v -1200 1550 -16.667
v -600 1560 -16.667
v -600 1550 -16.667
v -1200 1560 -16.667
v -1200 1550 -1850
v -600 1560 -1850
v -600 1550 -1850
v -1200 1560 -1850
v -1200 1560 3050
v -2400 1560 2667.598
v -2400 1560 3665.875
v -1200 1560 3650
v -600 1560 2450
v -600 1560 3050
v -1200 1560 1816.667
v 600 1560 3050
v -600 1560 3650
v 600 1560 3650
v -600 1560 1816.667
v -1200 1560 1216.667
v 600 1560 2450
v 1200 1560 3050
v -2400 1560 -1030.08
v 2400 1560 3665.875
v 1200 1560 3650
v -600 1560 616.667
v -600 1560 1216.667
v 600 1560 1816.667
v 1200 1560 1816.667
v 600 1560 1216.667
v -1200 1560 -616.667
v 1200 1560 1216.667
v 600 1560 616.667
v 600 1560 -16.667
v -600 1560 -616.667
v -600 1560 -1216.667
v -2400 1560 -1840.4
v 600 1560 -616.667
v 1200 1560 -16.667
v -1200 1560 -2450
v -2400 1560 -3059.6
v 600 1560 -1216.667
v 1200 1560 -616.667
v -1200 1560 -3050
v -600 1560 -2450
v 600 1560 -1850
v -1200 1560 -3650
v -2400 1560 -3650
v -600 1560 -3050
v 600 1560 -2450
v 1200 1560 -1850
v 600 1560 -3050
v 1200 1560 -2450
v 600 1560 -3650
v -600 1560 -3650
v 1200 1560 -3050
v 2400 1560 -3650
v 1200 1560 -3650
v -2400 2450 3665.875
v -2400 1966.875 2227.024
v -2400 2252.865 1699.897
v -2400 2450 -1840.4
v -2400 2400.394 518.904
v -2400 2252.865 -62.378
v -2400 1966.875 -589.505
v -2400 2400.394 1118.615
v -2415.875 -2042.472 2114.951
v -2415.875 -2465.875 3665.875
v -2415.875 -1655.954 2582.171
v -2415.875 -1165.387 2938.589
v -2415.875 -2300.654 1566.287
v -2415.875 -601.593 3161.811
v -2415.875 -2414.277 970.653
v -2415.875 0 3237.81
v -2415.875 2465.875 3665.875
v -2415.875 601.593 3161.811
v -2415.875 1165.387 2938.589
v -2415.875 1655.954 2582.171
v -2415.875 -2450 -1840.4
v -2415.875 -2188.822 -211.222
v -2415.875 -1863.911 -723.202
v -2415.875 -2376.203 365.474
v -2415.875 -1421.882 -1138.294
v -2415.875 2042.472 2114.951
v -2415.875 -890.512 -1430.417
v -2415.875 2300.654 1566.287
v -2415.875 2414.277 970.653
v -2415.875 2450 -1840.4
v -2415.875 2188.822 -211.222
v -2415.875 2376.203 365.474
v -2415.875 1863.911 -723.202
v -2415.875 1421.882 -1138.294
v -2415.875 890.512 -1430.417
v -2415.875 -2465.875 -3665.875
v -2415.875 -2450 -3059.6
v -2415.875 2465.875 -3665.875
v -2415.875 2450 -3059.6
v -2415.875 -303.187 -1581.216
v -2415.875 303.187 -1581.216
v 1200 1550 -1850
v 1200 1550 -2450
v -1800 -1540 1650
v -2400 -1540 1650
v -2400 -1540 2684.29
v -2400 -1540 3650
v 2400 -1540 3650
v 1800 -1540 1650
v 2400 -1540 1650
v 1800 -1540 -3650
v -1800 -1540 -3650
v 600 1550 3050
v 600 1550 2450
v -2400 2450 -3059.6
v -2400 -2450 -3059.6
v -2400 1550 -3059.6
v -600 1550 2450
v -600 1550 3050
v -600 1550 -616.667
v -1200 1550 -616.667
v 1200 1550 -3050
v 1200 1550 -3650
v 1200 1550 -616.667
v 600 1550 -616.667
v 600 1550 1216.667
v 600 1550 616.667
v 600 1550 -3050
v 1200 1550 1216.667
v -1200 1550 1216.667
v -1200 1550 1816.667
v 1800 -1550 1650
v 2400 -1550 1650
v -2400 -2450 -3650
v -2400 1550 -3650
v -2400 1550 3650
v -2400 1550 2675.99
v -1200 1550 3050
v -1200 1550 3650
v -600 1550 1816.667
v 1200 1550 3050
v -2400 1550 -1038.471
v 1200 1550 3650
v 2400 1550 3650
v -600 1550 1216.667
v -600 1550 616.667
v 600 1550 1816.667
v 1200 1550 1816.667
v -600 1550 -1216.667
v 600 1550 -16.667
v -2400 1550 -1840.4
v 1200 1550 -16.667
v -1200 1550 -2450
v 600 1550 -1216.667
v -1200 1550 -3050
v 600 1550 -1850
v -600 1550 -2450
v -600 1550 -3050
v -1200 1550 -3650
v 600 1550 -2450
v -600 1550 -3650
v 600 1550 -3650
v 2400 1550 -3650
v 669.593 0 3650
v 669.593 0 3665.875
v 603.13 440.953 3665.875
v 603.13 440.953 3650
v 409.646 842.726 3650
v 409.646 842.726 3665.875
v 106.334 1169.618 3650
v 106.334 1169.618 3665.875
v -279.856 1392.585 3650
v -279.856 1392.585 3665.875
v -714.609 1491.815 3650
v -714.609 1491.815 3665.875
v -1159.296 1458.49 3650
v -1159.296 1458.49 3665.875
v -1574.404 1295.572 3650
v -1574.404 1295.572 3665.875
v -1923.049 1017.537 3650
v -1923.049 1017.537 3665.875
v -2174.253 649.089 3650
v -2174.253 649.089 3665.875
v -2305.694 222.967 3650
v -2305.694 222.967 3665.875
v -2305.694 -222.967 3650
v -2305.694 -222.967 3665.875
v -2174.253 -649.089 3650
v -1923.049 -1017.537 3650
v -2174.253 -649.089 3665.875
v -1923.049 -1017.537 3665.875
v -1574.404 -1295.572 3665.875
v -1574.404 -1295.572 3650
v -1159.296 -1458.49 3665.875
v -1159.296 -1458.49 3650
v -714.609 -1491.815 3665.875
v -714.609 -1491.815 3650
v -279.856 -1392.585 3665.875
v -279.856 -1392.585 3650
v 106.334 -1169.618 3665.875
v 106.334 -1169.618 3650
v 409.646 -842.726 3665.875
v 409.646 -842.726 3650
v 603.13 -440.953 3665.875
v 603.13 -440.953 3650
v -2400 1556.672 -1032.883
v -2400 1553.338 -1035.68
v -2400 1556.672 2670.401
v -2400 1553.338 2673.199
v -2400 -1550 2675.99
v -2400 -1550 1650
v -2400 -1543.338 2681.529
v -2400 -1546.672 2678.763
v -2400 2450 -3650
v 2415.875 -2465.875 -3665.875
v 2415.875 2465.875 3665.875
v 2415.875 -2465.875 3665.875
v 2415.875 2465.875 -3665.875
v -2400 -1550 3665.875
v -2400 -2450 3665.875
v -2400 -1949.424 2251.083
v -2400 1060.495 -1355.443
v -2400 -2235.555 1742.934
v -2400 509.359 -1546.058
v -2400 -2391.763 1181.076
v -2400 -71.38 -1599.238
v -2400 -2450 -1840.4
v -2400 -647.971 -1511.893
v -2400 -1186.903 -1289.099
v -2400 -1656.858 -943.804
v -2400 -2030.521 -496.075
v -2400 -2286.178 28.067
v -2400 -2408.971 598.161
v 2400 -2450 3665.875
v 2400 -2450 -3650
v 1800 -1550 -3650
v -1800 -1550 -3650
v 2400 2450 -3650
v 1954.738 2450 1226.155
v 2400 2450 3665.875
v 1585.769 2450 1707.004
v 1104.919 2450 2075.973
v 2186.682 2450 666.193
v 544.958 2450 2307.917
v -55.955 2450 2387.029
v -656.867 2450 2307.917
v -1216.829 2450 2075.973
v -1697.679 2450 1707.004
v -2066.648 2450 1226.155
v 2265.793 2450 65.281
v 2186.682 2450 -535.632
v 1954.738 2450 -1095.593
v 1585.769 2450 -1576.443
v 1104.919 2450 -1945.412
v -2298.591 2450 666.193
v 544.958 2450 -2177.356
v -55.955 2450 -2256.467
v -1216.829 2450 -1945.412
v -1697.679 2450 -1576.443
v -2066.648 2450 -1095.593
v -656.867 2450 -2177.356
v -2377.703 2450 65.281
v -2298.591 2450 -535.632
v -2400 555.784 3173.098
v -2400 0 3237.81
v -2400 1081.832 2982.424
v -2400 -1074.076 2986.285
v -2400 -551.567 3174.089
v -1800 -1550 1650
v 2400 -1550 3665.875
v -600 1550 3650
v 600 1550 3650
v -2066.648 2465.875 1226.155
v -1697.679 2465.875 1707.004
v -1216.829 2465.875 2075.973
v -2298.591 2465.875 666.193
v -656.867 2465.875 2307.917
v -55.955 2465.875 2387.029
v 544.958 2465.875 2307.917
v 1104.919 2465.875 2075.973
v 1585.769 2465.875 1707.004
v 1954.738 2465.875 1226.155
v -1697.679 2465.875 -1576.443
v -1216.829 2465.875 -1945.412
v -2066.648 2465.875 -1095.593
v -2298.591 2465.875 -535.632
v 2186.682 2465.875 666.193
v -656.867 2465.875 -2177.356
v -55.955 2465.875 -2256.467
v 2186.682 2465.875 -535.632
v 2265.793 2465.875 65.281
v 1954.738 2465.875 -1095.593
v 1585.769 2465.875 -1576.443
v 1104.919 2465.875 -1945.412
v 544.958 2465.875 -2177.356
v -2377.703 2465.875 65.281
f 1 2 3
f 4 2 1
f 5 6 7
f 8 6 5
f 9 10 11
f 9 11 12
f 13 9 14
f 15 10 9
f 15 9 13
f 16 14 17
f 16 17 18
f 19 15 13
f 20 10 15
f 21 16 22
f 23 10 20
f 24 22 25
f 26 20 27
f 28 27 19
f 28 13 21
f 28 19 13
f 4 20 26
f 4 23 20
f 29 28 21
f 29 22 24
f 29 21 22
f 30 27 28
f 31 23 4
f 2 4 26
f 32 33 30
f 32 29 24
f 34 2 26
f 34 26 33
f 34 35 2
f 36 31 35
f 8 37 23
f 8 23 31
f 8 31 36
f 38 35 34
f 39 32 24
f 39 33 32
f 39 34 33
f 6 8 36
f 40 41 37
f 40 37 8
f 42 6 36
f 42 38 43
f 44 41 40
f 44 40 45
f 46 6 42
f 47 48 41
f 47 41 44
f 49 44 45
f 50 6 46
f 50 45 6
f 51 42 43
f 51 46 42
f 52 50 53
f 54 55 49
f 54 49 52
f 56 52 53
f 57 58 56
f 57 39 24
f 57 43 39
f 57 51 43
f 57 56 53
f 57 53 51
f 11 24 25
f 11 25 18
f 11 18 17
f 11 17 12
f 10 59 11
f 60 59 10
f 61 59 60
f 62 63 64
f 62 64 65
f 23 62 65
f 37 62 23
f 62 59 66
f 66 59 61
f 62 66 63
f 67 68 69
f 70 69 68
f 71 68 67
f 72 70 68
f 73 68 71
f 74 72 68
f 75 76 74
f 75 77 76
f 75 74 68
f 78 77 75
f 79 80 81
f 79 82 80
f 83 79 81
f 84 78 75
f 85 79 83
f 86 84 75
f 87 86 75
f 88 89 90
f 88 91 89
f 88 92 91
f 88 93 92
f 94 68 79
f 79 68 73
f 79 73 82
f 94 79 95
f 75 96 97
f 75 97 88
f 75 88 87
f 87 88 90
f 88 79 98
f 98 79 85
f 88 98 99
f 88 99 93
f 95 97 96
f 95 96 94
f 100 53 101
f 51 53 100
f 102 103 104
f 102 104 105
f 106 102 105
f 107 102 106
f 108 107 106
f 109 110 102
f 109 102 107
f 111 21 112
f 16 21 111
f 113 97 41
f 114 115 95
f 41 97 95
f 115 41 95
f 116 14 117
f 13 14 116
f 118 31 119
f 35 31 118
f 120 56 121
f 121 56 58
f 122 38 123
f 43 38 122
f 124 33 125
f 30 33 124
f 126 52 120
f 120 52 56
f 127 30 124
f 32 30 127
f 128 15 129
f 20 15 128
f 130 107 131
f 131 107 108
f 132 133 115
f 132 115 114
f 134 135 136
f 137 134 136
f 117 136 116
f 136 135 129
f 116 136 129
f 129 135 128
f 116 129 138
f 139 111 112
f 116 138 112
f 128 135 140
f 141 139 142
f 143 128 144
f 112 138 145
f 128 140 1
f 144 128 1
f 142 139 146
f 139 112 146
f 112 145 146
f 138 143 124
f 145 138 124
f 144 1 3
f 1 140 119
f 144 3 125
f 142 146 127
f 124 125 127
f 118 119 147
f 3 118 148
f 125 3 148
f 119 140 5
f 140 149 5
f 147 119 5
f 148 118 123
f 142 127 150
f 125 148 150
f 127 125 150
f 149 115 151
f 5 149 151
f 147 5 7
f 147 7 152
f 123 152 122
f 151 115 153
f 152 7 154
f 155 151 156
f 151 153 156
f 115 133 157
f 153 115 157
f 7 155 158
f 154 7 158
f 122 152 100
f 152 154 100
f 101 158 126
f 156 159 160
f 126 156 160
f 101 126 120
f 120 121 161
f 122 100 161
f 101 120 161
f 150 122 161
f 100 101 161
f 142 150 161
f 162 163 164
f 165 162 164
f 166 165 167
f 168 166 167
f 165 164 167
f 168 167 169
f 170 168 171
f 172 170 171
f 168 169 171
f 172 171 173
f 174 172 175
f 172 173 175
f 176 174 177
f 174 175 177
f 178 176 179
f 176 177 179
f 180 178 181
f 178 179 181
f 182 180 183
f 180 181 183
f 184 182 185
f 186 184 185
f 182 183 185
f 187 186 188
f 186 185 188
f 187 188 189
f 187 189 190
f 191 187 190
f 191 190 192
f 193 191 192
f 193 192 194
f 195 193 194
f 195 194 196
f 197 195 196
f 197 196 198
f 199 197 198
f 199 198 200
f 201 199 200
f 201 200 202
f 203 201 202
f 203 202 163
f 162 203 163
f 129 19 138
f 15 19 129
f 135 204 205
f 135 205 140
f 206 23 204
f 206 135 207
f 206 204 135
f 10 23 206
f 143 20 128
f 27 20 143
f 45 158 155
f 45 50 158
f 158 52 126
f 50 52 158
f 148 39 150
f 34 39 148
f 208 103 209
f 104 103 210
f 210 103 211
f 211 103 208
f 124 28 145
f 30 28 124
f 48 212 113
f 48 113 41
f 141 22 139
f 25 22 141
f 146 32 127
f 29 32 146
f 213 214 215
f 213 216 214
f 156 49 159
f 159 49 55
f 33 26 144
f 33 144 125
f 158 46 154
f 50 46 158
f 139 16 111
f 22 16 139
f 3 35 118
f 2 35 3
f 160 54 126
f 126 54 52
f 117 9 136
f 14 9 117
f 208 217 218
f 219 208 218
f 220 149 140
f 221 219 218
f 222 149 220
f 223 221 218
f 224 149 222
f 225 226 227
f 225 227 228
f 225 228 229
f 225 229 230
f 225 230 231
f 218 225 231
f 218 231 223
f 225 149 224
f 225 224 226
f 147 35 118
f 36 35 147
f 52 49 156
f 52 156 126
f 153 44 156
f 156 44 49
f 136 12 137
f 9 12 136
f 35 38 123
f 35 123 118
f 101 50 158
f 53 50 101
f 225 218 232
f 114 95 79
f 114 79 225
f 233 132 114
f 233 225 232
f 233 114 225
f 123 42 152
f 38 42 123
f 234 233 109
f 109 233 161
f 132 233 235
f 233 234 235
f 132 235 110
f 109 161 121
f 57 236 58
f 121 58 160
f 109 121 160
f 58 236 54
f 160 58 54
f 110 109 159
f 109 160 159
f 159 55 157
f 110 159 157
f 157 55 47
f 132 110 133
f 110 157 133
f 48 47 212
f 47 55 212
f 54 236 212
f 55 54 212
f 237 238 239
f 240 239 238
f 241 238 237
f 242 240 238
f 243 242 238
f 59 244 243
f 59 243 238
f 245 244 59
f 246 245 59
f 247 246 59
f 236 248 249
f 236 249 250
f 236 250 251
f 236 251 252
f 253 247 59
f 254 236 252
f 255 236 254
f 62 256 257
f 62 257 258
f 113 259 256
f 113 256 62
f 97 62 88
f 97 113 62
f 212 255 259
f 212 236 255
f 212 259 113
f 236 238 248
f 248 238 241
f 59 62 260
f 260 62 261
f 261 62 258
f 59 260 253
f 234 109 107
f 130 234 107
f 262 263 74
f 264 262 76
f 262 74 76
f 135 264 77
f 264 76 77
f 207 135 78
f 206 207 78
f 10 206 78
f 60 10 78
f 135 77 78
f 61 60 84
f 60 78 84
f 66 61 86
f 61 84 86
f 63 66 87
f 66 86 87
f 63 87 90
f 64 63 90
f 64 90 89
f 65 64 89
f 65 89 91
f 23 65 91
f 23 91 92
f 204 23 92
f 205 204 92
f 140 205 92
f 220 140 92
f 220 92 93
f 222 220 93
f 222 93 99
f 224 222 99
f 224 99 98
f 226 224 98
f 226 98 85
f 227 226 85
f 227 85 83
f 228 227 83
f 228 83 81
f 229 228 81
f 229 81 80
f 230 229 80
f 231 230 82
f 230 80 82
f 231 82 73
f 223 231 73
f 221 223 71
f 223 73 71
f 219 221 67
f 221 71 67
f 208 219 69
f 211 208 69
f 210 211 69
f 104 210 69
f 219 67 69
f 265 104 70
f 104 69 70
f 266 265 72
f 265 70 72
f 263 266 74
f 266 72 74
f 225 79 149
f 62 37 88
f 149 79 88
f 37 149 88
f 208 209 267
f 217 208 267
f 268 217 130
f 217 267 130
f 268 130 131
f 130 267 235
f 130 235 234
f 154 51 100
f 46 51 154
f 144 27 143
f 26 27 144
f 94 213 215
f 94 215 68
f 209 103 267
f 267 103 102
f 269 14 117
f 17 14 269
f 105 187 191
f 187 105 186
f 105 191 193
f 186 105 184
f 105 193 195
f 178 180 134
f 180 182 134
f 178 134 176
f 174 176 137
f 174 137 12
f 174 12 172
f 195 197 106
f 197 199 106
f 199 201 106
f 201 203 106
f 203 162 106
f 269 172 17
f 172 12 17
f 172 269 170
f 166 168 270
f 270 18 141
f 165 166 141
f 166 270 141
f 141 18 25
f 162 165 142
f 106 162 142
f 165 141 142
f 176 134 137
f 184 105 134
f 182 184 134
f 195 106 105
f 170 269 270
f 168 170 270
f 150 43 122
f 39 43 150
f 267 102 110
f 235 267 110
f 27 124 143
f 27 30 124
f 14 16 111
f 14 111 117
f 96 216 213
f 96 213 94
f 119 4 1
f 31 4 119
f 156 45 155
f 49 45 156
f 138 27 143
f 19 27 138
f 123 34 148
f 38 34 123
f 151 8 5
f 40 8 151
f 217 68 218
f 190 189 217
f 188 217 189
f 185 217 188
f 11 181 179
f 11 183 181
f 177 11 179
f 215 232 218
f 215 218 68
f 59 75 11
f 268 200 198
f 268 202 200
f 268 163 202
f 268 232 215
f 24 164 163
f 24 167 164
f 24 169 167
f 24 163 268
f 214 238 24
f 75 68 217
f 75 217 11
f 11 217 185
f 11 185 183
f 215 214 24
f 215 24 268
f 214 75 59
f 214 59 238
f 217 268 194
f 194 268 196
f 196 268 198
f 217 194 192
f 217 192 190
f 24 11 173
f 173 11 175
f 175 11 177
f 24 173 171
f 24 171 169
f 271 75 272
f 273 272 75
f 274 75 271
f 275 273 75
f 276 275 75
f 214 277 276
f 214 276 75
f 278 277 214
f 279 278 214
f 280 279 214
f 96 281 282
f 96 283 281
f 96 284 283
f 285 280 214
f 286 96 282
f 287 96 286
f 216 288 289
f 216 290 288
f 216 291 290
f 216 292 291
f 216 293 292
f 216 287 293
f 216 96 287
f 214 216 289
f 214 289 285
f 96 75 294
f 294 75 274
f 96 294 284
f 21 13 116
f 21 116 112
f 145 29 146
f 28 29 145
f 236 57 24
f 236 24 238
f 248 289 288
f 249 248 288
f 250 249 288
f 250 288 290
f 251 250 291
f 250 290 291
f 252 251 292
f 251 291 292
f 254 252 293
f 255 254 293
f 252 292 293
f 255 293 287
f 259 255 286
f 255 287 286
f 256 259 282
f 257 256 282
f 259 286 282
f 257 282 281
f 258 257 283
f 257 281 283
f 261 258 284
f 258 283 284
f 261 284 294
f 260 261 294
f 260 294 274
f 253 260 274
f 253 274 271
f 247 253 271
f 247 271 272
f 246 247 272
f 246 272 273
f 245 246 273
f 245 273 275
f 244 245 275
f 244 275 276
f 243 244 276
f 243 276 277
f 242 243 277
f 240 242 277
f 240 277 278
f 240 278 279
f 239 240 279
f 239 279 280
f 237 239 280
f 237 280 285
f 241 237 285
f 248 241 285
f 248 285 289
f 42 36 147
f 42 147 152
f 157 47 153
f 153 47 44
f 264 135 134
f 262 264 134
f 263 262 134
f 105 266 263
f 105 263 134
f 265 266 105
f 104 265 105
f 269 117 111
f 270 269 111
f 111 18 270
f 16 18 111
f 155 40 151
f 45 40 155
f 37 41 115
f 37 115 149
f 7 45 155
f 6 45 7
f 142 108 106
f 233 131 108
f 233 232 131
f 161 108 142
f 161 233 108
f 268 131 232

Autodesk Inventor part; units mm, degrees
ref_plane "YZ Plane" through (0, 0, 0) normal (1, 0, 0) x (0, 1, 0)
ref_plane "XZ Plane" through (0, 0, 0) normal (0, 1, 0) x (-1, 0, 0)
sketch "Sketch1" plane through (0, 0, 0) normal (0, 0, 1) x (1, 0, 0)
  line L0 (-2400, -2450) -> (2400, -2450)
  line L1 (2400, -2450) -> (2400, 2450)
  line L2 (2400, 2450) -> (-2400, 2450)
  line L3 (-2400, 2450) -> (-2400, -2450)
  line L4 (-2400, -2450) -> (2400, 2450) construction
  line L5 (2400, -2450) -> (-2400, 2450) construction
  line L6 (-2400, -1550) -> (2400, -1550)
  line L7 (-2400, 1550) -> (2400, 1550)
  line L8 (-2415.875, 2465.875) -> (2415.875, 2465.875)
  line L9 (2415.875, 2465.875) -> (2415.875, -2465.875)
  line L10 (2415.875, -2465.875) -> (-2415.875, -2465.875)
  line L11 (-2415.875, -2465.875) -> (-2415.875, 2465.875)
  line L12 (-2400, -1540) -> (2400, -1540)
  line L13 (-2400, 1560) -> (2400, 1560)
  point P0 (0, 0)
  dimension "d0" = 4800
  dimension "d1" = 4900
  dimension "d2" = 900
  dimension "d3" = 900
  dimension "d4" = 15.875
  dimension "d6" = 10
  dimension "d7" = 10
extrude "Extrusion1" add sketch "Sketch1" along normal mid plane 7300 contours L3 L12 L1 L6 | L3 L13 L1 L7 | L8 L9 L10 L11
sketch "Sketch2" plane through (-2415.875, -2465.875, 3650) normal (-1, 0, 0) x (0, 0, 1)
  line L0 (-7300, 4915.875) -> (0, 4915.875) projected
  line L1 (-7300, 4915.875) -> (0, 4915.875) projected
  line L2 (-7300, 15.875) -> (0, 15.875) projected
  line L3 (-7300, 15.875) -> (0, 15.875) projected
  line L4 (-7300, 15.875) -> (0, 15.875) construction
  line L5 (-7300, 15.875) -> (-6100, 15.875) construction
  line L6 (-7300, 15.875) -> (-6100, 15.875) construction
  line L7 (-6100, 15.875) -> (-6100, 2465.875) construction
  line L8 (-7300, 4915.875) -> (0, 4915.875) projected
  line L9 (-6709.6, 15.875) -> (-5490.4, 15.875)
  line L10 (-5490.4, 15.875) -> (-5490.4, 4915.875)
  line L11 (-5490.4, 4915.875) -> (-6709.6, 4915.875)
  line L12 (-6709.6, 4915.875) -> (-6709.6, 15.875)
  line L13 (-6709.6, 15.875) -> (-5490.4, 4915.875) construction
  line L14 (-5490.4, 15.875) -> (-6709.6, 4915.875) construction
  point P0 (-3650, 2465.875)
  point P1 (-6709.6, 4915.875)
  point P2 (-6709.6, 15.875)
  point P3 (-5490.4, 15.875)
  point P4 (-5490.4, 4915.875)
  dimension "d10" = 1200
  dimension "d11" = 0
  dimension "d12" = 2450
  dimension "d13" = 90
  dimension "d14" = 1219.2
ref_plane "Work Plane1" through (-2415.875, 0, -2450) normal (0, 1, 0) x (-1, 0, 0)
extrude "Extrusion2" cut sketch "Sketch2" against normal up to surface (15.875 mm away)
sketch "Sketch9" plane through (-2415.875, 0, -2450) normal (0, 1, 0) x (-1, 0, 0)
  line L0 (0, -609.6) -> (0, 609.6) projected
  line L1 (0, 0) -> (-3.2, 0) construction
  line L2 (0, 0) -> (3.2, 0) construction
  point P0 (-2415.875, 2450)
  dimension "d67" = 3.2
  dimension "d68" = 180
sketch "Sketch3" plane through (0, 0, -3650) normal (0, 0, -1) x (-1, 0, 0)
  line L0 (2400, -1540) -> (-2400, -1540) projected
  line L1 (2400, -1540) -> (1800, -1540)
  line L2 (2400, -1540) -> (3000, -1540) construction
  line L3 (-2400, -1540) -> (2400, -1540) projected
  line L4 (-2400, -1540) -> (-1800, -1540)
  line L5 (-2400, -1540) -> (-1800, -1540) construction
  point P0 (0, 0)
  dimension "d17" = 600
  dimension "d18" = 180
  dimension "d19" = 600
  dimension "d20" = 0
sketch "Sketch4" plane through (-2400, 1560, 3650) normal (0, 1, 0) x (1, 0, 0)
  line L0 (4800, 0) -> (4800, 7300) projected
  line L1 (4800, 7300) -> (4800, 0) projected
  line L2 (4800, 0) -> (4800, 7300) construction
  line L3 (4800, 0) -> (3600, 0) construction
  line L4 (0, 0) -> (4800, 0) construction
  line L5 (4800, 0) -> (6000, 0) construction
  line L6 (3600, 0) -> (3000, 0)
  line L7 (3000, 0) -> (3000, 600)
  line L8 (3000, 600) -> (3600, 600)
  line L9 (3600, 600) -> (3600, 0)
  line L10 (3000, 600) -> (2400, 600)
  line L11 (2400, 600) -> (2400, 1200)
  line L12 (2400, 1200) -> (3000, 1200)
  line L13 (3000, 1200) -> (3000, 600)
  point P0 (2400, 3650)
  dimension "d21" = 1200
  dimension "d22" = 180
  dimension "d23" = 600
  dimension "d24" = 600
  dimension "d33" = 600
  dimension "d34" = 600
extrude "Extrusion3" cut sketch "Sketch4" against normal up to surface (10 mm away) contours L6 L7 L8 L9
pattern_linear "Rectangular Pattern1" count 4 spacing 1833.3333 along (0, 0, -1) count 2 spacing 1800 along (-1, 0, 0) of "Extrusion3"
extrude "Extrusion4" cut sketch "Sketch4" against normal up to surface (10 mm away) contours L10 L11 L12 L13
pattern_linear "Rectangular Pattern2" count 2 spacing 600 along (-1, 0, 0) count 4 spacing 1833.3333 along (0, 0, -1) of "Extrusion4"
sketch "Sketch5" plane through (-2400, 1560, -3650) normal (0, 1, 0) x (1, 0, 0)
  line L0 (1800, -600) -> (3000, -600) projected
  line L1 (3000, -600) -> (3600, -600)
  line L2 (3600, -600) -> (3600, 0)
  line L3 (3600, 0) -> (3000, 0)
  line L4 (3000, 0) -> (3000, -600)
  point P0 (2400, -3650)
  dimension "d43" = 600
  dimension "d44" = 600
extrude "Extrusion5" cut sketch "Sketch5" against normal up to surface (10 mm away)
pattern_linear "Rectangular Pattern3" count 2 spacing 1800 along (-1, 0, 0) of "Extrusion5"
sketch "Sketch6" plane through (-2400, -1540, 3650) normal (0, 1, 0) x (1, 0, 0)
  line L0 (4800, 0) -> (4800, 7300) projected
  line L1 (4800, 7300) -> (4200, 7300)
  line L2 (4200, 7300) -> (4200, 2000)
  line L3 (4200, 2000) -> (4800, 2000)
  line L4 (4800, 2000) -> (4800, 7300)
  point P0 (2400, 3650)
  dimension "d53" = 600
  dimension "d54" = 5300
extrude "Extrusion6" cut sketch "Sketch6" against normal up to surface (10 mm away)
pattern_linear "Rectangular Pattern4" count 2 spacing 4200 along (-1, 0, 0) of "Extrusion6"
sketch "Sketch7" plane through (0, 0, 3650) normal (0, 0, 1) x (1, 0, 0)
  line L0 (-1200, 1550) -> (-1200, 1560) projected
  line L1 (-1200, 1560) -> (-2400, 1560) projected
  line L2 (-2400, 1560) -> (-2400, 2450) projected
  line L3 (-2400, 2450) -> (2400, 2450) projected
  line L4 (2400, 2450) -> (2400, 1560) projected
  line L5 (2400, 1560) -> (1200, 1560) projected
  line L6 (1200, 1560) -> (1200, 1550) projected
  line L7 (1200, 1550) -> (2400, 1550) projected
  line L8 (2400, 1550) -> (2400, -1540) projected
  line L9 (2400, -1540) -> (-2400, -1540) projected
  line L10 (-2400, -1540) -> (-2400, 1550) projected
  line L11 (-2400, 1550) -> (-1200, 1550) projected
  line L12 (-2415.875, -2465.875) -> (2415.875, -2465.875) projected
  line L13 (2415.875, -2465.875) -> (2415.875, 2465.875) projected
  line L14 (2415.875, 2465.875) -> (-2415.875, 2465.875) projected
  line L15 (-2415.875, 2465.875) -> (-2415.875, -2465.875) projected
  line L16 (2400, -1550) -> (2400, -2450) projected
  line L17 (2400, -2450) -> (-2400, -2450) projected
  line L18 (-2400, -2450) -> (-2400, -1550) projected
  line L19 (-2400, -1550) -> (2400, -1550) projected
  point P0 (0, 0)
extrude "Extrusion7" add sketch "Sketch7" along normal blind 15.875 contours L0 L1 L2 L3 L4 L5 L6 L7 L8 L9 L10 L11 | L15 L14 L13 L12 | L16 L17 L18 L19
sketch "Sketch8" plane through (0, 0, -3650) normal (0, 0, -1) x (-1, 0, 0)
  line L0 (2400, 1550) -> (2400, -2450) projected
  line L1 (2400, -2450) -> (-2400, -2450) projected
  line L2 (-2400, -2450) -> (-2400, 1550) projected
  line L3 (-2400, 1550) -> (-1200, 1550) projected
  line L4 (-1200, 1550) -> (-1200, 1560) projected
  line L5 (-1200, 1560) -> (-2400, 1560) projected
  line L6 (-2400, 1560) -> (-2400, 2450) projected
  line L7 (-2400, 2450) -> (2400, 2450) projected
  line L8 (2400, 2450) -> (2400, 1560) projected
  line L9 (2400, 1560) -> (1200, 1560) projected
  line L10 (1200, 1560) -> (1200, 1550) projected
  line L11 (1200, 1550) -> (2400, 1550) projected
  line L12 (-2415.875, -2465.875) -> (2415.875, -2465.875) projected
  line L13 (2415.875, -2465.875) -> (2415.875, 2465.875) projected
  line L14 (2415.875, 2465.875) -> (-2415.875, 2465.875) projected
  line L15 (-2415.875, 2465.875) -> (-2415.875, -2465.875) projected
  point P0 (0, 0)
extrude "Extrusion8" add sketch "Sketch8" along normal blind 15.875 contours L0 L1 L2 L3 L4 L5 L6 L7 L8 L9 L10 L11 | L15 L14 L13 L12
sketch "Sketch10" plane through (-2415.875, -2465.875, 3665.875) normal (-1, 0, 0) x (0, 0, 1)
  circle A0 centre (-2847.1158, 2465.875) radius 2419.0506
  point P0 (-3665.875, 2465.875)
extrude "Extrusion9" cut sketch "Sketch10" against normal blind 15.875
sketch "Sketch11" plane through (-2415.875, 2465.875, 3665.875) normal (0, 1, 0) x (1, 0, 0)
  circle A0 centre (2359.9202, 3600.5944) radius 2321.7481
  point P0 (2415.875, 3665.875)
extrude "Extrusion10" cut sketch "Sketch11" against normal blind 15.875
sketch "Sketch13" plane through (0, 0, 3665.875) normal (0, 0, 1) x (1, 0, 0)
  line L0 (-2400, 1560) -> (-1200, 1560) projected
  line L1 (-1200, 1560) -> (-2400, 1560) projected
  line L2 (-1200, 1560) -> (-600, 1560) projected
  line L3 (-600, 1560) -> (600, 1560) projected
  line L4 (600, 1560) -> (1200, 1560) projected
  line L5 (2400, 1560) -> (1200, 1560) projected
  line L6 (1200, 1560) -> (2400, 1560) projected
  line L7 (1200, 1560) -> (600, 1560) projected
  line L8 (600, 1560) -> (1200, 1560) projected
  line L9 (1200, 1560) -> (600, 1560) projected
  line L10 (600, 1560) -> (-600, 1560) projected
  line L11 (-600, 1560) -> (-1200, 1560) projected
  line L12 (-1200, 1560) -> (-600, 1560) projected
  line L13 (-600, 1560) -> (-1200, 1560) projected
  line L14 (-600, 1560) -> (-1200, 1560) projected
  line L15 (-1200, 1560) -> (-600, 1560) projected
  line L16 (-600, 1560) -> (600, 1560) projected
  line L17 (600, 1560) -> (1200, 1560) projected
  line L18 (1200, 1560) -> (600, 1560) projected
  line L19 (600, 1560) -> (-600, 1560) projected
  line L20 (-600, 1560) -> (-1200, 1560) projected
  line L21 (-1200, 1560) -> (-600, 1560) projected
  line L22 (-600, 1560) -> (600, 1560) projected
  line L23 (600, 1560) -> (1200, 1560) projected
  line L24 (1200, 1560) -> (600, 1560) projected
  line L25 (600, 1560) -> (-600, 1560) projected
  line L26 (600, 1560) -> (-600, 1560) projected
  line L27 (600, 1560) -> (-600, 1560) projected
  line L28 (-2400, 1560) -> (-2400, 1560) projected
  line L29 (-2400, 1560) -> (-2400, 2450) projected
  line L30 (-2400, 1560) -> (-2400, 2450) projected
  line L31 (2265.7933, 2450) -> (-2377.7029, 2450) projected
  line L32 (-2400, 2450) -> (2400, 2450) projected
  line L33 (-2415.875, 2450) -> (-2400, 2450) projected
  line L34 (-2415.875, 2450) -> (-2400, 2450) projected
  line L35 (2400, 2450) -> (-2400, 2450) projected
  line L36 (-2400, -1550) -> (2400, -1550) projected
  line L37 (2400, -1550) -> (2400, -2450) projected
  line L38 (2400, -2450) -> (-2400, -2450) projected
  line L39 (-2400, -2450) -> (-2400, -1550) projected
  line L40 (2400, 2450) -> (2400, 1560) projected
  line L41 (2400, 1560) -> (2400, 2450) projected
  circle A0 centre (-826.4052, 0) radius 1495.9981
  point P0 (0, 0)
extrude "Extrusion12" cut sketch "Sketch13" against normal blind 15.875
equation "\"d4\" = out_w_thick"
equation "\"d6\" = flr_clng_thick"
equation "\"d7\" = flr_clng_thick"
equation "\"d12\" = 0.5 * win_h"
equation "\"d14\" = win_w"
equation "\"d67\" = 0.5 * win_d"
equation "\"d63\" = out_w_thick"
equation "\"d65\" = out_w_thick"
equation "\"d69\" = out_w_thick"
equation "\"d71\" = out_w_thick"
equation "\"d75\" = out_w_thick"
equation "\"out_w_thick\" = 15.875"
equation "\"flr_clng_thick\" = 10"
equation "\"win_h\" = 4900"
equation "\"win_w\" = 1219.2"
equation "\"win_d\" = 6.4"
properties part number "ServerRoom" material "Gypsum Wall Board"
